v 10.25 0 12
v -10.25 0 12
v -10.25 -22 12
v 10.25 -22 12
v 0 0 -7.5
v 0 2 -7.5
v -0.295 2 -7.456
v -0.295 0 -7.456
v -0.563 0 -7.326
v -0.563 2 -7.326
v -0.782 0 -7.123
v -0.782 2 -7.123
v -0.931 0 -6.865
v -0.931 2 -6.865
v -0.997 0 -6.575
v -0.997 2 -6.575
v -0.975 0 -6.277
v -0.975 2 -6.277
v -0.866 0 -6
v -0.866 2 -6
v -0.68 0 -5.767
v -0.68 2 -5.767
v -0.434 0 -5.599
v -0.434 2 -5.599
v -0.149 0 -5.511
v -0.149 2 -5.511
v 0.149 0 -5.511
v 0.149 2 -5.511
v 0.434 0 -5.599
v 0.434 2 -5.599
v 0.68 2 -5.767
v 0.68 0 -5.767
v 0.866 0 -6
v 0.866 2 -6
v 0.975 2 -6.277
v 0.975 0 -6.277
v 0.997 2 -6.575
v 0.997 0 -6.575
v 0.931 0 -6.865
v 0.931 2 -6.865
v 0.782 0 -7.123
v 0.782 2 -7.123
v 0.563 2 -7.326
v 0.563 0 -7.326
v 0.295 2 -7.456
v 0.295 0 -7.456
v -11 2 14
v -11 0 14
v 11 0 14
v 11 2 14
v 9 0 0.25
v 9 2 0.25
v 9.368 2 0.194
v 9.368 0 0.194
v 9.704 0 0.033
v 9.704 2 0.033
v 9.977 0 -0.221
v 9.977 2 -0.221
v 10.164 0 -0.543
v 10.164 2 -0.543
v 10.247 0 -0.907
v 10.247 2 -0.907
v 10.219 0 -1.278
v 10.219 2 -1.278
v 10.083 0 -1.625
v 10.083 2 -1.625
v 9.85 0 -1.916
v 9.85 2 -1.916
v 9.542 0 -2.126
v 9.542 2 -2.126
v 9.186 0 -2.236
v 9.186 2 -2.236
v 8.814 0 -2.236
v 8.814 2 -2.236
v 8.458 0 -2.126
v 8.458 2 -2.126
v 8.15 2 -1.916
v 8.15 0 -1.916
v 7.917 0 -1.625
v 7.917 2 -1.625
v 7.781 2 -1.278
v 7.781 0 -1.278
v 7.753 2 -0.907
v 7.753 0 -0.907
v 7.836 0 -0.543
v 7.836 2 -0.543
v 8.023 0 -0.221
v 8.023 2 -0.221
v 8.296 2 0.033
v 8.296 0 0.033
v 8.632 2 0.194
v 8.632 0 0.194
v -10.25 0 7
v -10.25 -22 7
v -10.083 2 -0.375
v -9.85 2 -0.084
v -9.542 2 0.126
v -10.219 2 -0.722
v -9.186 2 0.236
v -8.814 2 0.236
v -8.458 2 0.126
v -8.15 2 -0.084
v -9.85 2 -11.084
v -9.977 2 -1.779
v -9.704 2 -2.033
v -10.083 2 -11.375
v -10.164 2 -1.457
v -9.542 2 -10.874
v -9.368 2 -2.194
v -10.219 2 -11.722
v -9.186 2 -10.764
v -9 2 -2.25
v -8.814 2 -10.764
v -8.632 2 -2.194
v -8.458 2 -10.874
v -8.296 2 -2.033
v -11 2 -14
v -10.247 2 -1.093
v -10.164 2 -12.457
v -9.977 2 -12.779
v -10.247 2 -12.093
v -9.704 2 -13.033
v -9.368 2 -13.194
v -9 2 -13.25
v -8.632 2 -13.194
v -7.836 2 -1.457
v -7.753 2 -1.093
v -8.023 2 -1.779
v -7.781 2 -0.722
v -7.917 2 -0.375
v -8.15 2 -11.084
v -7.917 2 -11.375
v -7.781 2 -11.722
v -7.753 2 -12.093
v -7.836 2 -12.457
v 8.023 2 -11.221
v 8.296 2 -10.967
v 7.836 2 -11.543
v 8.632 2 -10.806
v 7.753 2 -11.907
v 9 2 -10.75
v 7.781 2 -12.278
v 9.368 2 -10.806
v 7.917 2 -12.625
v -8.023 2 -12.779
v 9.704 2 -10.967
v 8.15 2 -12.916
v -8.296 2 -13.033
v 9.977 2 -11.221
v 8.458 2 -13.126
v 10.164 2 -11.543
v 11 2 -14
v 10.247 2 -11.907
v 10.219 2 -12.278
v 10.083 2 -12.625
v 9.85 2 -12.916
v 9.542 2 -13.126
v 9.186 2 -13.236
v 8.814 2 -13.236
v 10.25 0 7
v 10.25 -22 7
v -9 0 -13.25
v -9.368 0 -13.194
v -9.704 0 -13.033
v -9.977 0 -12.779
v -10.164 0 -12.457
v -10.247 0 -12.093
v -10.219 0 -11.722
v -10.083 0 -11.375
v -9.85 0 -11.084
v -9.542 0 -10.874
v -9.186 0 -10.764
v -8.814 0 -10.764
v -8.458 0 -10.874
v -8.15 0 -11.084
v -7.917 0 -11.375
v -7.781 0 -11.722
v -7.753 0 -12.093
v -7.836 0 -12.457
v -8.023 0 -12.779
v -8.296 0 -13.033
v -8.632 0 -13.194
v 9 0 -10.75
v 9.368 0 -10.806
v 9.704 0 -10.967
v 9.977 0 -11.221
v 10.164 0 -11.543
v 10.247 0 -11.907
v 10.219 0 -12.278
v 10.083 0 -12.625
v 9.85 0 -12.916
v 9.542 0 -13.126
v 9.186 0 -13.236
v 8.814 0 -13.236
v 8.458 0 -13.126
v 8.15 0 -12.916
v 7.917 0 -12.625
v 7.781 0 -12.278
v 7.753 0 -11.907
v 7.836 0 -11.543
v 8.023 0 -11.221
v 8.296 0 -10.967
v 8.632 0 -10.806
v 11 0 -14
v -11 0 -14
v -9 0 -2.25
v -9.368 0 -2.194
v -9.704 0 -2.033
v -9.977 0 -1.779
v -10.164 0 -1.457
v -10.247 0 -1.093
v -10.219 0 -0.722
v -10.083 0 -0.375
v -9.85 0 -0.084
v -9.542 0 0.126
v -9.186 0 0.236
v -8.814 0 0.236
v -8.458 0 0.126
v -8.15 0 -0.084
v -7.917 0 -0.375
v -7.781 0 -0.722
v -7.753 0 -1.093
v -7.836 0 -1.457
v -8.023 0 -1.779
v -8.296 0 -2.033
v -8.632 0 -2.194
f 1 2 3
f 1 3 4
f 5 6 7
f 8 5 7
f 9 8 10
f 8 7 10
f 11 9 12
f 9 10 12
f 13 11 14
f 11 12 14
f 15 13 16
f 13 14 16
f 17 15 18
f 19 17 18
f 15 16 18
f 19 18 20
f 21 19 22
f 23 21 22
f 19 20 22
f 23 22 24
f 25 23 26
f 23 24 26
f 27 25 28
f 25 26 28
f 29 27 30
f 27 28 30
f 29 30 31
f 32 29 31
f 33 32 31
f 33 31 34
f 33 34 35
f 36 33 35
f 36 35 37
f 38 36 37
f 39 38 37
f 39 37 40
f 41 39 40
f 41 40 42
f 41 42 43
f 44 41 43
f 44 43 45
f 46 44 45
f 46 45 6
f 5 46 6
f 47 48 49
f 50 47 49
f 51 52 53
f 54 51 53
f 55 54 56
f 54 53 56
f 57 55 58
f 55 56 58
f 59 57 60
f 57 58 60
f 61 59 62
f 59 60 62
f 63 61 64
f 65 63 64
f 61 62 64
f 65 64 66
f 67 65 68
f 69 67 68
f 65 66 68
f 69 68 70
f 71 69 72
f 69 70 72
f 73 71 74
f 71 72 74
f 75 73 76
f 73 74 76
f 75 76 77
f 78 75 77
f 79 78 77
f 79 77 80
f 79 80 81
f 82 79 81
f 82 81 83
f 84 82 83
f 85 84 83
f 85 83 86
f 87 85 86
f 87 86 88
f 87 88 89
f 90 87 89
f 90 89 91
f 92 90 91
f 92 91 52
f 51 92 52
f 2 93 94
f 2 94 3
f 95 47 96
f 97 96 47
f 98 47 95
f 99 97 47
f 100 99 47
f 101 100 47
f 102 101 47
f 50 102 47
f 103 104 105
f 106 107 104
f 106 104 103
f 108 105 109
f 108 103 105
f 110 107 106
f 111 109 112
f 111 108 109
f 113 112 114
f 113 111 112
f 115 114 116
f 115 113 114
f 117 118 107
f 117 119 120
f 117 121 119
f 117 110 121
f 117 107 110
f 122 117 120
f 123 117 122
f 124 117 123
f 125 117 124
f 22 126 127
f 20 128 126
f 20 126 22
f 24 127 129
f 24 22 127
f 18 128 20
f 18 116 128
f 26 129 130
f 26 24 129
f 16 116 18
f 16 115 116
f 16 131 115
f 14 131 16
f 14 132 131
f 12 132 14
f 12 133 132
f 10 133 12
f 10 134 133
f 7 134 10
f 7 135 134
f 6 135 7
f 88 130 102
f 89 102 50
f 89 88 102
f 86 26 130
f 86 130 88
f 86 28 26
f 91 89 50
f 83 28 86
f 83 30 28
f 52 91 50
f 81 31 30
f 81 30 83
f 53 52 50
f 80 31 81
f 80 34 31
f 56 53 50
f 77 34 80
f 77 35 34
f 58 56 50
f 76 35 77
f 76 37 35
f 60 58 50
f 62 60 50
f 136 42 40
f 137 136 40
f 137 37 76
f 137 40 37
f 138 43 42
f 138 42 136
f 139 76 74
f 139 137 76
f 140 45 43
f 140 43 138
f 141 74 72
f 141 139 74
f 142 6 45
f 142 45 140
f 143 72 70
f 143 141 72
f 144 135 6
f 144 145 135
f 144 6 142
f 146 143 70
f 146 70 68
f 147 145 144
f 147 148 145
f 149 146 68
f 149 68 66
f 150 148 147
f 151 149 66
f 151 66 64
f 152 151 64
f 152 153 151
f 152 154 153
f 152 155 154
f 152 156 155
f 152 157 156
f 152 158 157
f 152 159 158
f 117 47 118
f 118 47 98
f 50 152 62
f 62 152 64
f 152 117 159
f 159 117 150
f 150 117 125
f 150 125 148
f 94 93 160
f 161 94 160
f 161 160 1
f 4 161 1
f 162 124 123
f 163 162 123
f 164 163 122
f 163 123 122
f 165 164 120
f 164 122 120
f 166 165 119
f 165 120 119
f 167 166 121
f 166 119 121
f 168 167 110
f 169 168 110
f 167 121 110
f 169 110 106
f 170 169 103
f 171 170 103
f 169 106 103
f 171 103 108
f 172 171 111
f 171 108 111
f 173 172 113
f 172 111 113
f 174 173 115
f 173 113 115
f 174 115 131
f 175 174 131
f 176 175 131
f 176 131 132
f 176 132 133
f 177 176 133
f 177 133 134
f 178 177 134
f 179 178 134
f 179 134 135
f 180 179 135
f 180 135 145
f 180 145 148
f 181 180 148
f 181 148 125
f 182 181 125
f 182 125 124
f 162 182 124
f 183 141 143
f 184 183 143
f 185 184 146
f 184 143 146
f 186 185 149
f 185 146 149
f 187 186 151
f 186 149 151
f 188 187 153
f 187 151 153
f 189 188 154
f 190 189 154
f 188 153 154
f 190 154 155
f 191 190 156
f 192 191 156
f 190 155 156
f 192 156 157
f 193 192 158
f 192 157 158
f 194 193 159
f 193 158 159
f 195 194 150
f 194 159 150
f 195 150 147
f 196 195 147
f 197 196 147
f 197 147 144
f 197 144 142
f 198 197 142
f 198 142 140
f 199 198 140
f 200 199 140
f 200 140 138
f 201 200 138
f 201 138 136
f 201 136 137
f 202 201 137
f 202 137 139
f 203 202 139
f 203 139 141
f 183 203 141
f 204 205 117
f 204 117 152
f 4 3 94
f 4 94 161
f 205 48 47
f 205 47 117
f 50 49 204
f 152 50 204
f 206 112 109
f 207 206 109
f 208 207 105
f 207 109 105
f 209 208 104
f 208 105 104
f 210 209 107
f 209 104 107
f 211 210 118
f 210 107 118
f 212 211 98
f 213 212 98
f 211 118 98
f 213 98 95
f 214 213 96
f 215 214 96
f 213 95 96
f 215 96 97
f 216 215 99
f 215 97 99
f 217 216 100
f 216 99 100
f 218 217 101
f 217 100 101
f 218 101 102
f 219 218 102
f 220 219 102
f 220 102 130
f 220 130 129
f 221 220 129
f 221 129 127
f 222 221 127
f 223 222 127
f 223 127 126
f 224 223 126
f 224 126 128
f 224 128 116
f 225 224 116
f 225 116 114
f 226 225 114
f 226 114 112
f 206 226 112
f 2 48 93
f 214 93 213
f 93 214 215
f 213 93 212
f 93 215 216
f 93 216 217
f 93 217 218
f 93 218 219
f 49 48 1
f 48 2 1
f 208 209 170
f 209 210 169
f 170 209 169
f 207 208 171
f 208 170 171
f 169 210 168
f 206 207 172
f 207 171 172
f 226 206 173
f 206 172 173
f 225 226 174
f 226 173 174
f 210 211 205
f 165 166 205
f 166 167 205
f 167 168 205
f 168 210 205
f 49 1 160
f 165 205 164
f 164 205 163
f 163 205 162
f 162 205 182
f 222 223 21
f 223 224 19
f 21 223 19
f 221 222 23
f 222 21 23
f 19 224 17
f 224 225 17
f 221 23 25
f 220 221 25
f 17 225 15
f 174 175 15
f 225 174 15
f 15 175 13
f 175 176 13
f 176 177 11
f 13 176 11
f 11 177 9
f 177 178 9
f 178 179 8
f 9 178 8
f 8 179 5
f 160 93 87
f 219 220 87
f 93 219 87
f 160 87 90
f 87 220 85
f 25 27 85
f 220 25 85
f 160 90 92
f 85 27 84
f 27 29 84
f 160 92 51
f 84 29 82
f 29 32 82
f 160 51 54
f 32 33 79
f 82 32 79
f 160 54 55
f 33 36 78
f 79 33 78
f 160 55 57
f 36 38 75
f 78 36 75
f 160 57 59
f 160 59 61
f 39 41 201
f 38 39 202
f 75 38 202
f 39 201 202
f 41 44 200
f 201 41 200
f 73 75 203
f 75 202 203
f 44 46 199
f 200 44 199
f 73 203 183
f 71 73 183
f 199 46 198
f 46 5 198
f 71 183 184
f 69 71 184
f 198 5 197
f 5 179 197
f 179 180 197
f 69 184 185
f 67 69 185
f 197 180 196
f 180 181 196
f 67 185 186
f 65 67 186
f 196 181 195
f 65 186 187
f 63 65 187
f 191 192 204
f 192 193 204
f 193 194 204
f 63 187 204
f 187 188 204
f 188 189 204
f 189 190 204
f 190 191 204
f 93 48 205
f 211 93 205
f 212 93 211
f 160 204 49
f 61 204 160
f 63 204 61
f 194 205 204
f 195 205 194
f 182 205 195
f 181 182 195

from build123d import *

# Parameters (mm, degrees)
SKETCH_1_W                      = 22
SKETCH_1_H                      = 28
EXTRUDE_1_DEPTH                 = 2
CUT_EXTRUDE_1_REACH             = 19.916
SKETCH_2_R                      = 1.25
SKETCH_3_W                      = 20.5
SKETCH_3_H                      = 5
EXTRUDE_2_DEPTH                 = 22
CUT_EXTRUDE_2_REACH             = 31.883
SKETCH_4_R                      = 1
CUT_EXTRUDE_2_DIRECTION_2_DEPTH = 30.883105595


with BuildPart() as part:
    # 草图1 → 凸台-拉伸1 (new body)
    with BuildSketch(Plane(origin=(0, 0, 0), x_dir=(1, 0, 0), z_dir=(0, 1, 0))):
        Rectangle(SKETCH_1_W, SKETCH_1_H)
    extrude(amount=EXTRUDE_1_DEPTH)

    # 草图2 → 切除-拉伸1 (cut, up to next)
    with BuildSketch(Plane(origin=(0, 2, 0), x_dir=(1, 0, 0), z_dir=(0, 1, 0)), mode=Mode.PRIVATE) as cut_extrude_1_sk1:
        with Locations(Location((9, 12, 0), (0, 0, 270))):
            Circle(SKETCH_2_R)
    cut_extrude_1_tool1 = extrude(cut_extrude_1_sk1.sketch, amount=-CUT_EXTRUDE_1_REACH, mode=Mode.PRIVATE) & part.part
    # 草图2 → 切除-拉伸1 (cut, up to next)
    with BuildSketch(Plane(origin=(0, 2, 0), x_dir=(1, 0, 0), z_dir=(0, 1, 0)), mode=Mode.PRIVATE) as cut_extrude_1_sk2:
        with Locations(Location((-9, 12, 0), (0, 0, 90))):
            Circle(SKETCH_2_R)
    cut_extrude_1_tool2 = extrude(cut_extrude_1_sk2.sketch, amount=-CUT_EXTRUDE_1_REACH, mode=Mode.PRIVATE) & part.part
    # 草图2 → 切除-拉伸1 (cut, up to next)
    with BuildSketch(Plane(origin=(0, 2, 0), x_dir=(1, 0, 0), z_dir=(0, 1, 0)), mode=Mode.PRIVATE) as cut_extrude_1_sk3:
        with Locations(Location((-9, 1, 0), (0, 0, 90))):
            Circle(SKETCH_2_R)
    cut_extrude_1_tool3 = extrude(cut_extrude_1_sk3.sketch, amount=-CUT_EXTRUDE_1_REACH, mode=Mode.PRIVATE) & part.part
    # 草图2 → 切除-拉伸1 (cut, up to next)
    with BuildSketch(Plane(origin=(0, 2, 0), x_dir=(1, 0, 0), z_dir=(0, 1, 0)), mode=Mode.PRIVATE) as cut_extrude_1_sk4:
        with Locations(Location((9, 1, 0), (0, 0, 270))):
            Circle(SKETCH_2_R)
    cut_extrude_1_tool4 = extrude(cut_extrude_1_sk4.sketch, amount=-CUT_EXTRUDE_1_REACH, mode=Mode.PRIVATE) & part.part
    add(cut_extrude_1_tool1.solids().sort_by_distance((9, 2, -12))[0], mode=Mode.SUBTRACT)
    add(cut_extrude_1_tool2.solids().sort_by_distance((-9, 2, -12))[0], mode=Mode.SUBTRACT)
    add(cut_extrude_1_tool3.solids().sort_by_distance((-9, 2, -1))[0], mode=Mode.SUBTRACT)
    add(cut_extrude_1_tool4.solids().sort_by_distance((9, 2, -1))[0], mode=Mode.SUBTRACT)

    # 草图3 → 凸台-拉伸2 (add)
    with BuildSketch(Plane.XZ):
        with Locations((0, 9.5)):
            Rectangle(SKETCH_3_W, SKETCH_3_H)
    extrude(amount=EXTRUDE_2_DEPTH)

    # 草图4 → 切除-拉伸2 (cut, up to next)
    with BuildSketch(Plane(origin=(0, 2, 0), x_dir=(1, 0, 0), z_dir=(0, 1, 0)), mode=Mode.PRIVATE) as cut_extrude_2_sk1:
        with Locations(Location((0, 6.5, 0), (0, 0, 90))):
            Circle(SKETCH_4_R)
    cut_extrude_2_tool1 = extrude(cut_extrude_2_sk1.sketch, amount=-CUT_EXTRUDE_2_REACH, mode=Mode.PRIVATE) & part.part
    add(cut_extrude_2_tool1.solids().sort_by_distance((0, 2, -6.5))[0], mode=Mode.SUBTRACT)

    # 草图4 → 切除-拉伸2 direction 2 (cut)
    with BuildSketch(Plane(origin=(0, 2, 0), x_dir=(1, 0, 0), z_dir=(0, 1, 0))):
        with Locations(Location((0, 6.5, 0), (0, 0, 90))):
            Circle(SKETCH_4_R)
    extrude(amount=CUT_EXTRUDE_2_DIRECTION_2_DEPTH, mode=Mode.SUBTRACT)


solid = part.part
